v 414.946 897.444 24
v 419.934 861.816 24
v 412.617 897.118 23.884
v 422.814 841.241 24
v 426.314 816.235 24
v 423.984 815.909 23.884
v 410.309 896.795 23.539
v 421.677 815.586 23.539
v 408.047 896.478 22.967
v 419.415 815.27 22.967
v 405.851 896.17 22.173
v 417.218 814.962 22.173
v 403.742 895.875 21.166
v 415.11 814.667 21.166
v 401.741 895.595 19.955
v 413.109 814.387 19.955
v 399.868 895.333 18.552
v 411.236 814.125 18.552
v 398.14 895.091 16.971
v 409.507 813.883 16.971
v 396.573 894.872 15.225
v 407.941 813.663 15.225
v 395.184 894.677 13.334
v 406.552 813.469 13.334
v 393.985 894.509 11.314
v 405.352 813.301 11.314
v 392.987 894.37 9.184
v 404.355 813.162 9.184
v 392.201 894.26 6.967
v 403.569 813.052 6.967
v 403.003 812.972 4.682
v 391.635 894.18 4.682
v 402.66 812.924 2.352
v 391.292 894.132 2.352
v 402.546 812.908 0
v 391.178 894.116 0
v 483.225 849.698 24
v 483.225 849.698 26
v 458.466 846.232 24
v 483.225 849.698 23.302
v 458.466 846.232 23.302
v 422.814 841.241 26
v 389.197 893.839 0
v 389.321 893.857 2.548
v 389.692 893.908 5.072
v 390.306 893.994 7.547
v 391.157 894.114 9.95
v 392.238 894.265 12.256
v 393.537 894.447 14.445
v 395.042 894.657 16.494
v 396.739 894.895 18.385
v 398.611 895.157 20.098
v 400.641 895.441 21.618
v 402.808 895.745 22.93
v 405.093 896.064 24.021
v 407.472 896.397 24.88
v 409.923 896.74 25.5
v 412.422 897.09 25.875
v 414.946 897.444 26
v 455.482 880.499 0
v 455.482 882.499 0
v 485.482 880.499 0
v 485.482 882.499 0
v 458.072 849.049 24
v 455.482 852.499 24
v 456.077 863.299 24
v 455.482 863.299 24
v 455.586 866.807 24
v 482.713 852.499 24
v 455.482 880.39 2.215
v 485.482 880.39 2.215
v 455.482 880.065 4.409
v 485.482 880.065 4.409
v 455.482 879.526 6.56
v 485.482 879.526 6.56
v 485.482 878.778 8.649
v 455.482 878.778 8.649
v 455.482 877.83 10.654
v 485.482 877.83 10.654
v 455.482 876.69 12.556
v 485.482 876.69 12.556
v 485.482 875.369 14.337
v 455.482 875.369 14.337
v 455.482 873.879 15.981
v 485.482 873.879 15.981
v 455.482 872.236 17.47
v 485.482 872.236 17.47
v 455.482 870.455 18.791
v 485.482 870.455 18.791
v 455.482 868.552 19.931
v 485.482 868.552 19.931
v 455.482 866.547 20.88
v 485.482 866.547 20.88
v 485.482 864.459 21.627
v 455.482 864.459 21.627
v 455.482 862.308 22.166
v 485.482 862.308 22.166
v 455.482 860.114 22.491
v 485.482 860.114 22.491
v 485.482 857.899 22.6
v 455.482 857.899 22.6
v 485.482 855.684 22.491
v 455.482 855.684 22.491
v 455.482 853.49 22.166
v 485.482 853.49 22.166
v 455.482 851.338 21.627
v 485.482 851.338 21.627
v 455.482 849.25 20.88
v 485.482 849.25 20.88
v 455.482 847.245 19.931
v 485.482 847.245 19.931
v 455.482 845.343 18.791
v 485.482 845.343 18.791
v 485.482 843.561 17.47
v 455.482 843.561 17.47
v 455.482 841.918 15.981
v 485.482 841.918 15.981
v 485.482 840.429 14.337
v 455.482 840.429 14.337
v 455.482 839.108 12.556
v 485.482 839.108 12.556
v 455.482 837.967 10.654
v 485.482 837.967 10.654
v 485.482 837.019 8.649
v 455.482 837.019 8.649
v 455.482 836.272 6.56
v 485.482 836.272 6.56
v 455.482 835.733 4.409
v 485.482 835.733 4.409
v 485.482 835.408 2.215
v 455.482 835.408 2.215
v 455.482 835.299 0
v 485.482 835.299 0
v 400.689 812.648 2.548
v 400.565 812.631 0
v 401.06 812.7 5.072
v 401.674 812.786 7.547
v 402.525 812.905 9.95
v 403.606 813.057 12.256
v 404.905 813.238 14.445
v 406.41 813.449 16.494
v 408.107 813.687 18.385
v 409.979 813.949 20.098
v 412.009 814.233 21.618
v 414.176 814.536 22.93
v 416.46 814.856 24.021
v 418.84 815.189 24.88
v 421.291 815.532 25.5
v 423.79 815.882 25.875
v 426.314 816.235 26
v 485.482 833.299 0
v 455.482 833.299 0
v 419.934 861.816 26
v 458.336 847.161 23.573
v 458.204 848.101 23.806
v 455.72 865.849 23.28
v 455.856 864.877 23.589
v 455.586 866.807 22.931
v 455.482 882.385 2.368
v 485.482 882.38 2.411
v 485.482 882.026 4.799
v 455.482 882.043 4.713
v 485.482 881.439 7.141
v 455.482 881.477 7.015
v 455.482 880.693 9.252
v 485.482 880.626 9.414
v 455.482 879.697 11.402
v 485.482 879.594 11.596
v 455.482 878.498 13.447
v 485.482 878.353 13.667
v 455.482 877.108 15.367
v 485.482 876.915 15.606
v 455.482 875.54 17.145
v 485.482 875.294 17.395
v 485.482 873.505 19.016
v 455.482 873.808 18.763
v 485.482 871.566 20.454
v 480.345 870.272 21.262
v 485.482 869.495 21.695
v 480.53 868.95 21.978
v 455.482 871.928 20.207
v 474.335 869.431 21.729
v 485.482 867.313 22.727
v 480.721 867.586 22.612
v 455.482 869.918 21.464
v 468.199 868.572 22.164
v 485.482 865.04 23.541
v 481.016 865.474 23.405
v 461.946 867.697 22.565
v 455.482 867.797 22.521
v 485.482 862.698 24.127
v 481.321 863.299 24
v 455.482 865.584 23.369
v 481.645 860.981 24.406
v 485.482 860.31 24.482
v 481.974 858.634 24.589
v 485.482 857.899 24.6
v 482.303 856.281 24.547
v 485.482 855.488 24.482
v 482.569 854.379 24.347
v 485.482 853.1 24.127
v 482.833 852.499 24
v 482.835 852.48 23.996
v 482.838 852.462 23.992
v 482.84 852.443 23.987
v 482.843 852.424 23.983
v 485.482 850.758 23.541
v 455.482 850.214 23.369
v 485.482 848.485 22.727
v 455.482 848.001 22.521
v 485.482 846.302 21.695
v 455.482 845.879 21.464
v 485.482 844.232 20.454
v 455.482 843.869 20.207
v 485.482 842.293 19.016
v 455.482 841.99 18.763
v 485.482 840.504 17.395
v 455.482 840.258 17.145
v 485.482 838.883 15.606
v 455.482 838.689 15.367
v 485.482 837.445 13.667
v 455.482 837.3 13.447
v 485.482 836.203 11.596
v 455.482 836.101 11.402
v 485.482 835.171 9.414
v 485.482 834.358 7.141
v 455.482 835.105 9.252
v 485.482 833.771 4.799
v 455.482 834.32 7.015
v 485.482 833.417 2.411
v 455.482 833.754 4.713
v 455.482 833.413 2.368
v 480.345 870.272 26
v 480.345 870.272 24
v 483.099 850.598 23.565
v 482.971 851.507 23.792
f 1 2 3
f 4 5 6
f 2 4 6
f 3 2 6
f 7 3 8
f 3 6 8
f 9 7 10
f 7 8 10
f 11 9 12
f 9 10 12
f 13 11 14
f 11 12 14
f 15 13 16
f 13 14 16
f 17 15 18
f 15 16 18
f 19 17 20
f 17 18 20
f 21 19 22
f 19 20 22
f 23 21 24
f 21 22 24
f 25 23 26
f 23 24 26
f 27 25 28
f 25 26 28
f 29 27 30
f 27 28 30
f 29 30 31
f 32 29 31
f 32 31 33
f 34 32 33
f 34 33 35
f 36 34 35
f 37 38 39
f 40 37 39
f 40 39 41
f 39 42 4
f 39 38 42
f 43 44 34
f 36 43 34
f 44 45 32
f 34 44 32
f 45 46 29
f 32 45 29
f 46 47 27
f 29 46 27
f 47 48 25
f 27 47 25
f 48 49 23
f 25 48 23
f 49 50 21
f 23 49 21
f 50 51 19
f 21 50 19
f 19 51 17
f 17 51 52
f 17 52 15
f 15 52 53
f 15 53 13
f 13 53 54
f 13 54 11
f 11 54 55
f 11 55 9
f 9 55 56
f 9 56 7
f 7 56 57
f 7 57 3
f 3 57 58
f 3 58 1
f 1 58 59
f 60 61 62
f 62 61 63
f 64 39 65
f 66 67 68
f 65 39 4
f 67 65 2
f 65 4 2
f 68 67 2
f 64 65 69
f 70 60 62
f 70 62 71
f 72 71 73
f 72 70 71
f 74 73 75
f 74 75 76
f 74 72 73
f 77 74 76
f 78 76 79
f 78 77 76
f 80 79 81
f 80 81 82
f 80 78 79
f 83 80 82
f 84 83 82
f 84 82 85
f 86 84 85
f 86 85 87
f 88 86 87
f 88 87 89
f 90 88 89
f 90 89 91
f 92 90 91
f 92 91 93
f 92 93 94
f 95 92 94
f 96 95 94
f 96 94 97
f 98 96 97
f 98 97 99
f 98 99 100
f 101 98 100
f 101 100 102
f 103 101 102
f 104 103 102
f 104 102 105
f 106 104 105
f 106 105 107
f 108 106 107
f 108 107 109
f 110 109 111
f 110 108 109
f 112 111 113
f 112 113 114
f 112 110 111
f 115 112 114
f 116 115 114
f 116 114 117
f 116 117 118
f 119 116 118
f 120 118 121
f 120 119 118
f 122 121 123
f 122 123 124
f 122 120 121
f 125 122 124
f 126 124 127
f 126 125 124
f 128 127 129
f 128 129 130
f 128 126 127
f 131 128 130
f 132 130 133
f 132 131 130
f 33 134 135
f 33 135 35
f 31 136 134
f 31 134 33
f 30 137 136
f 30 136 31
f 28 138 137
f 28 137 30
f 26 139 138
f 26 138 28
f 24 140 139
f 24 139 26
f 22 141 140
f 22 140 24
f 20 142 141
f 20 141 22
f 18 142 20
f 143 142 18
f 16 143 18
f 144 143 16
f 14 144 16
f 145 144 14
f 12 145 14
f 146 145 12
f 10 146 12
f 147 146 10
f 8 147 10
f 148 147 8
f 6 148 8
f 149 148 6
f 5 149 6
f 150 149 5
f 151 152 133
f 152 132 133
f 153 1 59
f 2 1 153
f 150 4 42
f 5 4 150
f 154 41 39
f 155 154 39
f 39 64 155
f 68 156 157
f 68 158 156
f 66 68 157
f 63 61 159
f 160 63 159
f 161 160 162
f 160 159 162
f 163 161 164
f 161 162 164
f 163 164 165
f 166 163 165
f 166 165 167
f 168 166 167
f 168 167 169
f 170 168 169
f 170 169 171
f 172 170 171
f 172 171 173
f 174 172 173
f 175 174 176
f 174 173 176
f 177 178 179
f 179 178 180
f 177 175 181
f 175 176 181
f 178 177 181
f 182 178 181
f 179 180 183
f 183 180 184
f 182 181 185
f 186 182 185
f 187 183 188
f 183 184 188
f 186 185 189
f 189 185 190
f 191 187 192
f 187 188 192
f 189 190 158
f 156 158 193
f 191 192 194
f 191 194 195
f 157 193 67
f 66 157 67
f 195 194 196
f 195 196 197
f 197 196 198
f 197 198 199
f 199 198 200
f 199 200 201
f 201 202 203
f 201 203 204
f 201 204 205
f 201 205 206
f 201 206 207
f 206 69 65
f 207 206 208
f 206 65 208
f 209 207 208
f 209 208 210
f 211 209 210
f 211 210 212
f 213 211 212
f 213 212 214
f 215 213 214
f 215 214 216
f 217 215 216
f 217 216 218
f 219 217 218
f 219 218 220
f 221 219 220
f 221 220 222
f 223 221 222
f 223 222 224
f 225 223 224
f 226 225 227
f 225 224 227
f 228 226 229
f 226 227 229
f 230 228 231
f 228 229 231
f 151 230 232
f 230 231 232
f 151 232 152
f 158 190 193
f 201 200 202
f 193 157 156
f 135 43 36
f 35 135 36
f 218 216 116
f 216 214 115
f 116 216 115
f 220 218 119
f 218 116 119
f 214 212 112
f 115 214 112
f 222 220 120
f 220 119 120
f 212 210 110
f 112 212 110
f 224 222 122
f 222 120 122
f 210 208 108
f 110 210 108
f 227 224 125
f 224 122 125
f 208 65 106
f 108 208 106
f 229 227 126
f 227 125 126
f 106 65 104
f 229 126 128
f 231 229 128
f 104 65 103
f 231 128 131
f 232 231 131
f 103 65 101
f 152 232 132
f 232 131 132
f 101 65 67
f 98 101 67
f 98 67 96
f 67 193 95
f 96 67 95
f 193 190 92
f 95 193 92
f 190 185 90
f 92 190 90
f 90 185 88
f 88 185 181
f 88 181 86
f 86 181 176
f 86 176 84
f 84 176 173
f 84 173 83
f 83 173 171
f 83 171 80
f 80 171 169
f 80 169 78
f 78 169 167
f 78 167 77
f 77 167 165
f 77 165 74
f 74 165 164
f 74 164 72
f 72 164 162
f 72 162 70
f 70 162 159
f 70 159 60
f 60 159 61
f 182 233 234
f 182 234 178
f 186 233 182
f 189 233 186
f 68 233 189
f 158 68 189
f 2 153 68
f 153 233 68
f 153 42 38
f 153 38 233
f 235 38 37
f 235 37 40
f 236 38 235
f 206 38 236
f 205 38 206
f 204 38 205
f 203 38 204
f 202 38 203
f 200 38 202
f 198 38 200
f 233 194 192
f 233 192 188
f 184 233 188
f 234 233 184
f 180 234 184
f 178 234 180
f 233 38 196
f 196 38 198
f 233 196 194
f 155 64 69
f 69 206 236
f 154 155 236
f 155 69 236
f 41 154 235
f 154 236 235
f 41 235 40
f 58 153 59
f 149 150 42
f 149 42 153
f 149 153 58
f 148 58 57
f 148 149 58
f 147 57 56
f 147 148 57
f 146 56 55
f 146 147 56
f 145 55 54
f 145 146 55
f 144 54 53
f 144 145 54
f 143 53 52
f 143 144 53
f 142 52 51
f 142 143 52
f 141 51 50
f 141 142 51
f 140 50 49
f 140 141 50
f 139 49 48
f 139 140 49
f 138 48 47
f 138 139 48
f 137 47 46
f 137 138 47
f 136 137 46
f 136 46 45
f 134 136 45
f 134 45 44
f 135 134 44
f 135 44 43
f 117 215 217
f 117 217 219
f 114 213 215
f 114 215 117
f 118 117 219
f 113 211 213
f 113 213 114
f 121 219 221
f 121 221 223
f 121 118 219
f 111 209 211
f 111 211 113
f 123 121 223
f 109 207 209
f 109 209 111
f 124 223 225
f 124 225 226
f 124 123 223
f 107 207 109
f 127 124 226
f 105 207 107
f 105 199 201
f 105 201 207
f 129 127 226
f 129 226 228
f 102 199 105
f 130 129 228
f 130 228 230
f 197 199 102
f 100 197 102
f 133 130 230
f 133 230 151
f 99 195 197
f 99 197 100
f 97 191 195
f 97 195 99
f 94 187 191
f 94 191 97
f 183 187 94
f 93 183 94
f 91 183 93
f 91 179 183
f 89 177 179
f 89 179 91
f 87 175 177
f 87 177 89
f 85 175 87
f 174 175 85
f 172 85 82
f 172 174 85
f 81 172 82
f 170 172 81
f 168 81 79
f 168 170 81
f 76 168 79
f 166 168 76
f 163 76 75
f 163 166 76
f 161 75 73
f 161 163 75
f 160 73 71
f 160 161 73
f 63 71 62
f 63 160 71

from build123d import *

# Parameters (mm, degrees)
SKETCH3_R               = 26
SKETCH3_R_2             = 24
BOSS_EXTRUDE1_DEPTH     = 82
SKETCH2_R               = 24.6
SKETCH2_R_2             = 22.6
BOSS_EXTRUDE2_DEPTH     = 30
CUT_EXTRUDE1_DEPTH      = 30
CUT_EXTRUDE1_DEPTH_BACK = 30
SKETCH5_W               = 101.816386604
SKETCH5_H               = 90.816460778
CUT_EXTRUDE2_DEPTH      = 30
SKETCH6_W               = 2
SKETCH6_H               = 20.775230247
BOSS_EXTRUDE3_DEPTH     = 61
BOSS_EXTRUDE5_DEPTH     = 25
CUT_EXTRUDE3_START      = -32
SKETCH8_R               = 22.6
CUT_EXTRUDE3_DEPTH      = 32


with BuildPart() as part:
    # Sketch3 → Boss-Extrude1 (new body)
    with BuildSketch(Plane(origin=(-103.870896529, 742.017814767, 0), x_dir=(-0.9903438719336157, -0.13863266326351154, 0), z_dir=(0.13863266326351156, -0.9903438719336158, 0))):
        with Locations((-535.354479902, 0)):
            Circle(SKETCH3_R)
        with Locations((-535.354479902, 0)):
            Circle(SKETCH3_R_2, mode=Mode.SUBTRACT)
    extrude(amount=-BOSS_EXTRUDE1_DEPTH)

    # Sketch4 → Cut-Extrude1 (cut, two sides: drawn at the far end of the back side and taken through both)
    with BuildSketch(Plane.XY.offset(-CUT_EXTRUDE1_DEPTH_BACK)):
        Polygon((414.924769966, 897.597101018), (426.314131953, 816.235432106), (452.063072624, 819.839881351), (440.673710637, 901.201550263), align=None)
    extrude(amount=CUT_EXTRUDE1_DEPTH + CUT_EXTRUDE1_DEPTH_BACK, mode=Mode.SUBTRACT)


with BuildPart() as body_2:
    # Sketch2 → Boss-Extrude2 (new body)
    with BuildSketch(Plane(origin=(455.481917253, 0, 0), x_dir=(0, 0, -1), z_dir=(1, 0, 0))):
        with Locations((0, 857.898759871)):
            Circle(SKETCH2_R)
        with Locations((0, 857.898759871)):
            Circle(SKETCH2_R_2, mode=Mode.SUBTRACT)
    extrude(amount=BOSS_EXTRUDE2_DEPTH)


with BuildPart() as cut_extrude2_tool:
    # Sketch5 → Cut-Extrude2 (new body)
    with BuildSketch(Plane.XY):
        with Locations((437.415428166, 854.729783017)):
            Rectangle(SKETCH5_W, SKETCH5_H)
    extrude(amount=-CUT_EXTRUDE2_DEPTH)


with BuildPart() as part_1:
    add(part.part)

    # Cut-Extrude2: cut by cut_extrude2_tool
    add(cut_extrude2_tool.part, mode=Mode.SUBTRACT)



with BuildPart() as body_2_1:
    add(body_2.part)

    # Cut-Extrude2: cut by cut_extrude2_tool
    add(cut_extrude2_tool.part, mode=Mode.SUBTRACT)


with BuildPart() as part_2:
    add(part_1.part)

    add(body_2_1.part)  # Boss-Extrude3 merges body 2
    # Sketch6 → Boss-Extrude3 (add)
    with BuildSketch(Plane(origin=(530.185028483, 74.217617339, 0), x_dir=(0, 0, -1), z_dir=(0.9903438719336157, 0.13863266326351165, 0))):
        with Locations((-25, 784.889811472)):
            Rectangle(SKETCH6_W, SKETCH6_H)
    extrude(amount=BOSS_EXTRUDE3_DEPTH)

    # Sketch7 → Boss-Extrude5 (add)
    with BuildSketch(Plane(origin=(590.596004671, 82.674209798, 0), x_dir=(0, 0, -1), z_dir=(0.9903438719336163, 0.1386326632635082, 0))):
        with BuildLine():
            Line((-26, 774.502196348), (-26, 795.277426595))
            Line((-26, 795.277426595), (-20.191250984, 795.277426595))
            ThreePointArc((-20.191250984, 795.277426595), (-24.123503055, 785.245711867), (-23.302052486, 774.502196348))
            Line((-23.302052486, 774.502196348), (-26, 774.502196348))
        make_face()
    extrude(amount=-BOSS_EXTRUDE5_DEPTH)

    # Sketch8 → Cut-Extrude3 (cut)
    with BuildSketch(Plane(origin=(485.481917253, 0, 0), x_dir=(0, 0, -1), z_dir=(1, 0, 0)).offset(CUT_EXTRUDE3_START)):
        with Locations((0, 857.898759871)):
            Circle(SKETCH8_R)
    extrude(amount=CUT_EXTRUDE3_DEPTH, mode=Mode.SUBTRACT)


solid = part_2.part
